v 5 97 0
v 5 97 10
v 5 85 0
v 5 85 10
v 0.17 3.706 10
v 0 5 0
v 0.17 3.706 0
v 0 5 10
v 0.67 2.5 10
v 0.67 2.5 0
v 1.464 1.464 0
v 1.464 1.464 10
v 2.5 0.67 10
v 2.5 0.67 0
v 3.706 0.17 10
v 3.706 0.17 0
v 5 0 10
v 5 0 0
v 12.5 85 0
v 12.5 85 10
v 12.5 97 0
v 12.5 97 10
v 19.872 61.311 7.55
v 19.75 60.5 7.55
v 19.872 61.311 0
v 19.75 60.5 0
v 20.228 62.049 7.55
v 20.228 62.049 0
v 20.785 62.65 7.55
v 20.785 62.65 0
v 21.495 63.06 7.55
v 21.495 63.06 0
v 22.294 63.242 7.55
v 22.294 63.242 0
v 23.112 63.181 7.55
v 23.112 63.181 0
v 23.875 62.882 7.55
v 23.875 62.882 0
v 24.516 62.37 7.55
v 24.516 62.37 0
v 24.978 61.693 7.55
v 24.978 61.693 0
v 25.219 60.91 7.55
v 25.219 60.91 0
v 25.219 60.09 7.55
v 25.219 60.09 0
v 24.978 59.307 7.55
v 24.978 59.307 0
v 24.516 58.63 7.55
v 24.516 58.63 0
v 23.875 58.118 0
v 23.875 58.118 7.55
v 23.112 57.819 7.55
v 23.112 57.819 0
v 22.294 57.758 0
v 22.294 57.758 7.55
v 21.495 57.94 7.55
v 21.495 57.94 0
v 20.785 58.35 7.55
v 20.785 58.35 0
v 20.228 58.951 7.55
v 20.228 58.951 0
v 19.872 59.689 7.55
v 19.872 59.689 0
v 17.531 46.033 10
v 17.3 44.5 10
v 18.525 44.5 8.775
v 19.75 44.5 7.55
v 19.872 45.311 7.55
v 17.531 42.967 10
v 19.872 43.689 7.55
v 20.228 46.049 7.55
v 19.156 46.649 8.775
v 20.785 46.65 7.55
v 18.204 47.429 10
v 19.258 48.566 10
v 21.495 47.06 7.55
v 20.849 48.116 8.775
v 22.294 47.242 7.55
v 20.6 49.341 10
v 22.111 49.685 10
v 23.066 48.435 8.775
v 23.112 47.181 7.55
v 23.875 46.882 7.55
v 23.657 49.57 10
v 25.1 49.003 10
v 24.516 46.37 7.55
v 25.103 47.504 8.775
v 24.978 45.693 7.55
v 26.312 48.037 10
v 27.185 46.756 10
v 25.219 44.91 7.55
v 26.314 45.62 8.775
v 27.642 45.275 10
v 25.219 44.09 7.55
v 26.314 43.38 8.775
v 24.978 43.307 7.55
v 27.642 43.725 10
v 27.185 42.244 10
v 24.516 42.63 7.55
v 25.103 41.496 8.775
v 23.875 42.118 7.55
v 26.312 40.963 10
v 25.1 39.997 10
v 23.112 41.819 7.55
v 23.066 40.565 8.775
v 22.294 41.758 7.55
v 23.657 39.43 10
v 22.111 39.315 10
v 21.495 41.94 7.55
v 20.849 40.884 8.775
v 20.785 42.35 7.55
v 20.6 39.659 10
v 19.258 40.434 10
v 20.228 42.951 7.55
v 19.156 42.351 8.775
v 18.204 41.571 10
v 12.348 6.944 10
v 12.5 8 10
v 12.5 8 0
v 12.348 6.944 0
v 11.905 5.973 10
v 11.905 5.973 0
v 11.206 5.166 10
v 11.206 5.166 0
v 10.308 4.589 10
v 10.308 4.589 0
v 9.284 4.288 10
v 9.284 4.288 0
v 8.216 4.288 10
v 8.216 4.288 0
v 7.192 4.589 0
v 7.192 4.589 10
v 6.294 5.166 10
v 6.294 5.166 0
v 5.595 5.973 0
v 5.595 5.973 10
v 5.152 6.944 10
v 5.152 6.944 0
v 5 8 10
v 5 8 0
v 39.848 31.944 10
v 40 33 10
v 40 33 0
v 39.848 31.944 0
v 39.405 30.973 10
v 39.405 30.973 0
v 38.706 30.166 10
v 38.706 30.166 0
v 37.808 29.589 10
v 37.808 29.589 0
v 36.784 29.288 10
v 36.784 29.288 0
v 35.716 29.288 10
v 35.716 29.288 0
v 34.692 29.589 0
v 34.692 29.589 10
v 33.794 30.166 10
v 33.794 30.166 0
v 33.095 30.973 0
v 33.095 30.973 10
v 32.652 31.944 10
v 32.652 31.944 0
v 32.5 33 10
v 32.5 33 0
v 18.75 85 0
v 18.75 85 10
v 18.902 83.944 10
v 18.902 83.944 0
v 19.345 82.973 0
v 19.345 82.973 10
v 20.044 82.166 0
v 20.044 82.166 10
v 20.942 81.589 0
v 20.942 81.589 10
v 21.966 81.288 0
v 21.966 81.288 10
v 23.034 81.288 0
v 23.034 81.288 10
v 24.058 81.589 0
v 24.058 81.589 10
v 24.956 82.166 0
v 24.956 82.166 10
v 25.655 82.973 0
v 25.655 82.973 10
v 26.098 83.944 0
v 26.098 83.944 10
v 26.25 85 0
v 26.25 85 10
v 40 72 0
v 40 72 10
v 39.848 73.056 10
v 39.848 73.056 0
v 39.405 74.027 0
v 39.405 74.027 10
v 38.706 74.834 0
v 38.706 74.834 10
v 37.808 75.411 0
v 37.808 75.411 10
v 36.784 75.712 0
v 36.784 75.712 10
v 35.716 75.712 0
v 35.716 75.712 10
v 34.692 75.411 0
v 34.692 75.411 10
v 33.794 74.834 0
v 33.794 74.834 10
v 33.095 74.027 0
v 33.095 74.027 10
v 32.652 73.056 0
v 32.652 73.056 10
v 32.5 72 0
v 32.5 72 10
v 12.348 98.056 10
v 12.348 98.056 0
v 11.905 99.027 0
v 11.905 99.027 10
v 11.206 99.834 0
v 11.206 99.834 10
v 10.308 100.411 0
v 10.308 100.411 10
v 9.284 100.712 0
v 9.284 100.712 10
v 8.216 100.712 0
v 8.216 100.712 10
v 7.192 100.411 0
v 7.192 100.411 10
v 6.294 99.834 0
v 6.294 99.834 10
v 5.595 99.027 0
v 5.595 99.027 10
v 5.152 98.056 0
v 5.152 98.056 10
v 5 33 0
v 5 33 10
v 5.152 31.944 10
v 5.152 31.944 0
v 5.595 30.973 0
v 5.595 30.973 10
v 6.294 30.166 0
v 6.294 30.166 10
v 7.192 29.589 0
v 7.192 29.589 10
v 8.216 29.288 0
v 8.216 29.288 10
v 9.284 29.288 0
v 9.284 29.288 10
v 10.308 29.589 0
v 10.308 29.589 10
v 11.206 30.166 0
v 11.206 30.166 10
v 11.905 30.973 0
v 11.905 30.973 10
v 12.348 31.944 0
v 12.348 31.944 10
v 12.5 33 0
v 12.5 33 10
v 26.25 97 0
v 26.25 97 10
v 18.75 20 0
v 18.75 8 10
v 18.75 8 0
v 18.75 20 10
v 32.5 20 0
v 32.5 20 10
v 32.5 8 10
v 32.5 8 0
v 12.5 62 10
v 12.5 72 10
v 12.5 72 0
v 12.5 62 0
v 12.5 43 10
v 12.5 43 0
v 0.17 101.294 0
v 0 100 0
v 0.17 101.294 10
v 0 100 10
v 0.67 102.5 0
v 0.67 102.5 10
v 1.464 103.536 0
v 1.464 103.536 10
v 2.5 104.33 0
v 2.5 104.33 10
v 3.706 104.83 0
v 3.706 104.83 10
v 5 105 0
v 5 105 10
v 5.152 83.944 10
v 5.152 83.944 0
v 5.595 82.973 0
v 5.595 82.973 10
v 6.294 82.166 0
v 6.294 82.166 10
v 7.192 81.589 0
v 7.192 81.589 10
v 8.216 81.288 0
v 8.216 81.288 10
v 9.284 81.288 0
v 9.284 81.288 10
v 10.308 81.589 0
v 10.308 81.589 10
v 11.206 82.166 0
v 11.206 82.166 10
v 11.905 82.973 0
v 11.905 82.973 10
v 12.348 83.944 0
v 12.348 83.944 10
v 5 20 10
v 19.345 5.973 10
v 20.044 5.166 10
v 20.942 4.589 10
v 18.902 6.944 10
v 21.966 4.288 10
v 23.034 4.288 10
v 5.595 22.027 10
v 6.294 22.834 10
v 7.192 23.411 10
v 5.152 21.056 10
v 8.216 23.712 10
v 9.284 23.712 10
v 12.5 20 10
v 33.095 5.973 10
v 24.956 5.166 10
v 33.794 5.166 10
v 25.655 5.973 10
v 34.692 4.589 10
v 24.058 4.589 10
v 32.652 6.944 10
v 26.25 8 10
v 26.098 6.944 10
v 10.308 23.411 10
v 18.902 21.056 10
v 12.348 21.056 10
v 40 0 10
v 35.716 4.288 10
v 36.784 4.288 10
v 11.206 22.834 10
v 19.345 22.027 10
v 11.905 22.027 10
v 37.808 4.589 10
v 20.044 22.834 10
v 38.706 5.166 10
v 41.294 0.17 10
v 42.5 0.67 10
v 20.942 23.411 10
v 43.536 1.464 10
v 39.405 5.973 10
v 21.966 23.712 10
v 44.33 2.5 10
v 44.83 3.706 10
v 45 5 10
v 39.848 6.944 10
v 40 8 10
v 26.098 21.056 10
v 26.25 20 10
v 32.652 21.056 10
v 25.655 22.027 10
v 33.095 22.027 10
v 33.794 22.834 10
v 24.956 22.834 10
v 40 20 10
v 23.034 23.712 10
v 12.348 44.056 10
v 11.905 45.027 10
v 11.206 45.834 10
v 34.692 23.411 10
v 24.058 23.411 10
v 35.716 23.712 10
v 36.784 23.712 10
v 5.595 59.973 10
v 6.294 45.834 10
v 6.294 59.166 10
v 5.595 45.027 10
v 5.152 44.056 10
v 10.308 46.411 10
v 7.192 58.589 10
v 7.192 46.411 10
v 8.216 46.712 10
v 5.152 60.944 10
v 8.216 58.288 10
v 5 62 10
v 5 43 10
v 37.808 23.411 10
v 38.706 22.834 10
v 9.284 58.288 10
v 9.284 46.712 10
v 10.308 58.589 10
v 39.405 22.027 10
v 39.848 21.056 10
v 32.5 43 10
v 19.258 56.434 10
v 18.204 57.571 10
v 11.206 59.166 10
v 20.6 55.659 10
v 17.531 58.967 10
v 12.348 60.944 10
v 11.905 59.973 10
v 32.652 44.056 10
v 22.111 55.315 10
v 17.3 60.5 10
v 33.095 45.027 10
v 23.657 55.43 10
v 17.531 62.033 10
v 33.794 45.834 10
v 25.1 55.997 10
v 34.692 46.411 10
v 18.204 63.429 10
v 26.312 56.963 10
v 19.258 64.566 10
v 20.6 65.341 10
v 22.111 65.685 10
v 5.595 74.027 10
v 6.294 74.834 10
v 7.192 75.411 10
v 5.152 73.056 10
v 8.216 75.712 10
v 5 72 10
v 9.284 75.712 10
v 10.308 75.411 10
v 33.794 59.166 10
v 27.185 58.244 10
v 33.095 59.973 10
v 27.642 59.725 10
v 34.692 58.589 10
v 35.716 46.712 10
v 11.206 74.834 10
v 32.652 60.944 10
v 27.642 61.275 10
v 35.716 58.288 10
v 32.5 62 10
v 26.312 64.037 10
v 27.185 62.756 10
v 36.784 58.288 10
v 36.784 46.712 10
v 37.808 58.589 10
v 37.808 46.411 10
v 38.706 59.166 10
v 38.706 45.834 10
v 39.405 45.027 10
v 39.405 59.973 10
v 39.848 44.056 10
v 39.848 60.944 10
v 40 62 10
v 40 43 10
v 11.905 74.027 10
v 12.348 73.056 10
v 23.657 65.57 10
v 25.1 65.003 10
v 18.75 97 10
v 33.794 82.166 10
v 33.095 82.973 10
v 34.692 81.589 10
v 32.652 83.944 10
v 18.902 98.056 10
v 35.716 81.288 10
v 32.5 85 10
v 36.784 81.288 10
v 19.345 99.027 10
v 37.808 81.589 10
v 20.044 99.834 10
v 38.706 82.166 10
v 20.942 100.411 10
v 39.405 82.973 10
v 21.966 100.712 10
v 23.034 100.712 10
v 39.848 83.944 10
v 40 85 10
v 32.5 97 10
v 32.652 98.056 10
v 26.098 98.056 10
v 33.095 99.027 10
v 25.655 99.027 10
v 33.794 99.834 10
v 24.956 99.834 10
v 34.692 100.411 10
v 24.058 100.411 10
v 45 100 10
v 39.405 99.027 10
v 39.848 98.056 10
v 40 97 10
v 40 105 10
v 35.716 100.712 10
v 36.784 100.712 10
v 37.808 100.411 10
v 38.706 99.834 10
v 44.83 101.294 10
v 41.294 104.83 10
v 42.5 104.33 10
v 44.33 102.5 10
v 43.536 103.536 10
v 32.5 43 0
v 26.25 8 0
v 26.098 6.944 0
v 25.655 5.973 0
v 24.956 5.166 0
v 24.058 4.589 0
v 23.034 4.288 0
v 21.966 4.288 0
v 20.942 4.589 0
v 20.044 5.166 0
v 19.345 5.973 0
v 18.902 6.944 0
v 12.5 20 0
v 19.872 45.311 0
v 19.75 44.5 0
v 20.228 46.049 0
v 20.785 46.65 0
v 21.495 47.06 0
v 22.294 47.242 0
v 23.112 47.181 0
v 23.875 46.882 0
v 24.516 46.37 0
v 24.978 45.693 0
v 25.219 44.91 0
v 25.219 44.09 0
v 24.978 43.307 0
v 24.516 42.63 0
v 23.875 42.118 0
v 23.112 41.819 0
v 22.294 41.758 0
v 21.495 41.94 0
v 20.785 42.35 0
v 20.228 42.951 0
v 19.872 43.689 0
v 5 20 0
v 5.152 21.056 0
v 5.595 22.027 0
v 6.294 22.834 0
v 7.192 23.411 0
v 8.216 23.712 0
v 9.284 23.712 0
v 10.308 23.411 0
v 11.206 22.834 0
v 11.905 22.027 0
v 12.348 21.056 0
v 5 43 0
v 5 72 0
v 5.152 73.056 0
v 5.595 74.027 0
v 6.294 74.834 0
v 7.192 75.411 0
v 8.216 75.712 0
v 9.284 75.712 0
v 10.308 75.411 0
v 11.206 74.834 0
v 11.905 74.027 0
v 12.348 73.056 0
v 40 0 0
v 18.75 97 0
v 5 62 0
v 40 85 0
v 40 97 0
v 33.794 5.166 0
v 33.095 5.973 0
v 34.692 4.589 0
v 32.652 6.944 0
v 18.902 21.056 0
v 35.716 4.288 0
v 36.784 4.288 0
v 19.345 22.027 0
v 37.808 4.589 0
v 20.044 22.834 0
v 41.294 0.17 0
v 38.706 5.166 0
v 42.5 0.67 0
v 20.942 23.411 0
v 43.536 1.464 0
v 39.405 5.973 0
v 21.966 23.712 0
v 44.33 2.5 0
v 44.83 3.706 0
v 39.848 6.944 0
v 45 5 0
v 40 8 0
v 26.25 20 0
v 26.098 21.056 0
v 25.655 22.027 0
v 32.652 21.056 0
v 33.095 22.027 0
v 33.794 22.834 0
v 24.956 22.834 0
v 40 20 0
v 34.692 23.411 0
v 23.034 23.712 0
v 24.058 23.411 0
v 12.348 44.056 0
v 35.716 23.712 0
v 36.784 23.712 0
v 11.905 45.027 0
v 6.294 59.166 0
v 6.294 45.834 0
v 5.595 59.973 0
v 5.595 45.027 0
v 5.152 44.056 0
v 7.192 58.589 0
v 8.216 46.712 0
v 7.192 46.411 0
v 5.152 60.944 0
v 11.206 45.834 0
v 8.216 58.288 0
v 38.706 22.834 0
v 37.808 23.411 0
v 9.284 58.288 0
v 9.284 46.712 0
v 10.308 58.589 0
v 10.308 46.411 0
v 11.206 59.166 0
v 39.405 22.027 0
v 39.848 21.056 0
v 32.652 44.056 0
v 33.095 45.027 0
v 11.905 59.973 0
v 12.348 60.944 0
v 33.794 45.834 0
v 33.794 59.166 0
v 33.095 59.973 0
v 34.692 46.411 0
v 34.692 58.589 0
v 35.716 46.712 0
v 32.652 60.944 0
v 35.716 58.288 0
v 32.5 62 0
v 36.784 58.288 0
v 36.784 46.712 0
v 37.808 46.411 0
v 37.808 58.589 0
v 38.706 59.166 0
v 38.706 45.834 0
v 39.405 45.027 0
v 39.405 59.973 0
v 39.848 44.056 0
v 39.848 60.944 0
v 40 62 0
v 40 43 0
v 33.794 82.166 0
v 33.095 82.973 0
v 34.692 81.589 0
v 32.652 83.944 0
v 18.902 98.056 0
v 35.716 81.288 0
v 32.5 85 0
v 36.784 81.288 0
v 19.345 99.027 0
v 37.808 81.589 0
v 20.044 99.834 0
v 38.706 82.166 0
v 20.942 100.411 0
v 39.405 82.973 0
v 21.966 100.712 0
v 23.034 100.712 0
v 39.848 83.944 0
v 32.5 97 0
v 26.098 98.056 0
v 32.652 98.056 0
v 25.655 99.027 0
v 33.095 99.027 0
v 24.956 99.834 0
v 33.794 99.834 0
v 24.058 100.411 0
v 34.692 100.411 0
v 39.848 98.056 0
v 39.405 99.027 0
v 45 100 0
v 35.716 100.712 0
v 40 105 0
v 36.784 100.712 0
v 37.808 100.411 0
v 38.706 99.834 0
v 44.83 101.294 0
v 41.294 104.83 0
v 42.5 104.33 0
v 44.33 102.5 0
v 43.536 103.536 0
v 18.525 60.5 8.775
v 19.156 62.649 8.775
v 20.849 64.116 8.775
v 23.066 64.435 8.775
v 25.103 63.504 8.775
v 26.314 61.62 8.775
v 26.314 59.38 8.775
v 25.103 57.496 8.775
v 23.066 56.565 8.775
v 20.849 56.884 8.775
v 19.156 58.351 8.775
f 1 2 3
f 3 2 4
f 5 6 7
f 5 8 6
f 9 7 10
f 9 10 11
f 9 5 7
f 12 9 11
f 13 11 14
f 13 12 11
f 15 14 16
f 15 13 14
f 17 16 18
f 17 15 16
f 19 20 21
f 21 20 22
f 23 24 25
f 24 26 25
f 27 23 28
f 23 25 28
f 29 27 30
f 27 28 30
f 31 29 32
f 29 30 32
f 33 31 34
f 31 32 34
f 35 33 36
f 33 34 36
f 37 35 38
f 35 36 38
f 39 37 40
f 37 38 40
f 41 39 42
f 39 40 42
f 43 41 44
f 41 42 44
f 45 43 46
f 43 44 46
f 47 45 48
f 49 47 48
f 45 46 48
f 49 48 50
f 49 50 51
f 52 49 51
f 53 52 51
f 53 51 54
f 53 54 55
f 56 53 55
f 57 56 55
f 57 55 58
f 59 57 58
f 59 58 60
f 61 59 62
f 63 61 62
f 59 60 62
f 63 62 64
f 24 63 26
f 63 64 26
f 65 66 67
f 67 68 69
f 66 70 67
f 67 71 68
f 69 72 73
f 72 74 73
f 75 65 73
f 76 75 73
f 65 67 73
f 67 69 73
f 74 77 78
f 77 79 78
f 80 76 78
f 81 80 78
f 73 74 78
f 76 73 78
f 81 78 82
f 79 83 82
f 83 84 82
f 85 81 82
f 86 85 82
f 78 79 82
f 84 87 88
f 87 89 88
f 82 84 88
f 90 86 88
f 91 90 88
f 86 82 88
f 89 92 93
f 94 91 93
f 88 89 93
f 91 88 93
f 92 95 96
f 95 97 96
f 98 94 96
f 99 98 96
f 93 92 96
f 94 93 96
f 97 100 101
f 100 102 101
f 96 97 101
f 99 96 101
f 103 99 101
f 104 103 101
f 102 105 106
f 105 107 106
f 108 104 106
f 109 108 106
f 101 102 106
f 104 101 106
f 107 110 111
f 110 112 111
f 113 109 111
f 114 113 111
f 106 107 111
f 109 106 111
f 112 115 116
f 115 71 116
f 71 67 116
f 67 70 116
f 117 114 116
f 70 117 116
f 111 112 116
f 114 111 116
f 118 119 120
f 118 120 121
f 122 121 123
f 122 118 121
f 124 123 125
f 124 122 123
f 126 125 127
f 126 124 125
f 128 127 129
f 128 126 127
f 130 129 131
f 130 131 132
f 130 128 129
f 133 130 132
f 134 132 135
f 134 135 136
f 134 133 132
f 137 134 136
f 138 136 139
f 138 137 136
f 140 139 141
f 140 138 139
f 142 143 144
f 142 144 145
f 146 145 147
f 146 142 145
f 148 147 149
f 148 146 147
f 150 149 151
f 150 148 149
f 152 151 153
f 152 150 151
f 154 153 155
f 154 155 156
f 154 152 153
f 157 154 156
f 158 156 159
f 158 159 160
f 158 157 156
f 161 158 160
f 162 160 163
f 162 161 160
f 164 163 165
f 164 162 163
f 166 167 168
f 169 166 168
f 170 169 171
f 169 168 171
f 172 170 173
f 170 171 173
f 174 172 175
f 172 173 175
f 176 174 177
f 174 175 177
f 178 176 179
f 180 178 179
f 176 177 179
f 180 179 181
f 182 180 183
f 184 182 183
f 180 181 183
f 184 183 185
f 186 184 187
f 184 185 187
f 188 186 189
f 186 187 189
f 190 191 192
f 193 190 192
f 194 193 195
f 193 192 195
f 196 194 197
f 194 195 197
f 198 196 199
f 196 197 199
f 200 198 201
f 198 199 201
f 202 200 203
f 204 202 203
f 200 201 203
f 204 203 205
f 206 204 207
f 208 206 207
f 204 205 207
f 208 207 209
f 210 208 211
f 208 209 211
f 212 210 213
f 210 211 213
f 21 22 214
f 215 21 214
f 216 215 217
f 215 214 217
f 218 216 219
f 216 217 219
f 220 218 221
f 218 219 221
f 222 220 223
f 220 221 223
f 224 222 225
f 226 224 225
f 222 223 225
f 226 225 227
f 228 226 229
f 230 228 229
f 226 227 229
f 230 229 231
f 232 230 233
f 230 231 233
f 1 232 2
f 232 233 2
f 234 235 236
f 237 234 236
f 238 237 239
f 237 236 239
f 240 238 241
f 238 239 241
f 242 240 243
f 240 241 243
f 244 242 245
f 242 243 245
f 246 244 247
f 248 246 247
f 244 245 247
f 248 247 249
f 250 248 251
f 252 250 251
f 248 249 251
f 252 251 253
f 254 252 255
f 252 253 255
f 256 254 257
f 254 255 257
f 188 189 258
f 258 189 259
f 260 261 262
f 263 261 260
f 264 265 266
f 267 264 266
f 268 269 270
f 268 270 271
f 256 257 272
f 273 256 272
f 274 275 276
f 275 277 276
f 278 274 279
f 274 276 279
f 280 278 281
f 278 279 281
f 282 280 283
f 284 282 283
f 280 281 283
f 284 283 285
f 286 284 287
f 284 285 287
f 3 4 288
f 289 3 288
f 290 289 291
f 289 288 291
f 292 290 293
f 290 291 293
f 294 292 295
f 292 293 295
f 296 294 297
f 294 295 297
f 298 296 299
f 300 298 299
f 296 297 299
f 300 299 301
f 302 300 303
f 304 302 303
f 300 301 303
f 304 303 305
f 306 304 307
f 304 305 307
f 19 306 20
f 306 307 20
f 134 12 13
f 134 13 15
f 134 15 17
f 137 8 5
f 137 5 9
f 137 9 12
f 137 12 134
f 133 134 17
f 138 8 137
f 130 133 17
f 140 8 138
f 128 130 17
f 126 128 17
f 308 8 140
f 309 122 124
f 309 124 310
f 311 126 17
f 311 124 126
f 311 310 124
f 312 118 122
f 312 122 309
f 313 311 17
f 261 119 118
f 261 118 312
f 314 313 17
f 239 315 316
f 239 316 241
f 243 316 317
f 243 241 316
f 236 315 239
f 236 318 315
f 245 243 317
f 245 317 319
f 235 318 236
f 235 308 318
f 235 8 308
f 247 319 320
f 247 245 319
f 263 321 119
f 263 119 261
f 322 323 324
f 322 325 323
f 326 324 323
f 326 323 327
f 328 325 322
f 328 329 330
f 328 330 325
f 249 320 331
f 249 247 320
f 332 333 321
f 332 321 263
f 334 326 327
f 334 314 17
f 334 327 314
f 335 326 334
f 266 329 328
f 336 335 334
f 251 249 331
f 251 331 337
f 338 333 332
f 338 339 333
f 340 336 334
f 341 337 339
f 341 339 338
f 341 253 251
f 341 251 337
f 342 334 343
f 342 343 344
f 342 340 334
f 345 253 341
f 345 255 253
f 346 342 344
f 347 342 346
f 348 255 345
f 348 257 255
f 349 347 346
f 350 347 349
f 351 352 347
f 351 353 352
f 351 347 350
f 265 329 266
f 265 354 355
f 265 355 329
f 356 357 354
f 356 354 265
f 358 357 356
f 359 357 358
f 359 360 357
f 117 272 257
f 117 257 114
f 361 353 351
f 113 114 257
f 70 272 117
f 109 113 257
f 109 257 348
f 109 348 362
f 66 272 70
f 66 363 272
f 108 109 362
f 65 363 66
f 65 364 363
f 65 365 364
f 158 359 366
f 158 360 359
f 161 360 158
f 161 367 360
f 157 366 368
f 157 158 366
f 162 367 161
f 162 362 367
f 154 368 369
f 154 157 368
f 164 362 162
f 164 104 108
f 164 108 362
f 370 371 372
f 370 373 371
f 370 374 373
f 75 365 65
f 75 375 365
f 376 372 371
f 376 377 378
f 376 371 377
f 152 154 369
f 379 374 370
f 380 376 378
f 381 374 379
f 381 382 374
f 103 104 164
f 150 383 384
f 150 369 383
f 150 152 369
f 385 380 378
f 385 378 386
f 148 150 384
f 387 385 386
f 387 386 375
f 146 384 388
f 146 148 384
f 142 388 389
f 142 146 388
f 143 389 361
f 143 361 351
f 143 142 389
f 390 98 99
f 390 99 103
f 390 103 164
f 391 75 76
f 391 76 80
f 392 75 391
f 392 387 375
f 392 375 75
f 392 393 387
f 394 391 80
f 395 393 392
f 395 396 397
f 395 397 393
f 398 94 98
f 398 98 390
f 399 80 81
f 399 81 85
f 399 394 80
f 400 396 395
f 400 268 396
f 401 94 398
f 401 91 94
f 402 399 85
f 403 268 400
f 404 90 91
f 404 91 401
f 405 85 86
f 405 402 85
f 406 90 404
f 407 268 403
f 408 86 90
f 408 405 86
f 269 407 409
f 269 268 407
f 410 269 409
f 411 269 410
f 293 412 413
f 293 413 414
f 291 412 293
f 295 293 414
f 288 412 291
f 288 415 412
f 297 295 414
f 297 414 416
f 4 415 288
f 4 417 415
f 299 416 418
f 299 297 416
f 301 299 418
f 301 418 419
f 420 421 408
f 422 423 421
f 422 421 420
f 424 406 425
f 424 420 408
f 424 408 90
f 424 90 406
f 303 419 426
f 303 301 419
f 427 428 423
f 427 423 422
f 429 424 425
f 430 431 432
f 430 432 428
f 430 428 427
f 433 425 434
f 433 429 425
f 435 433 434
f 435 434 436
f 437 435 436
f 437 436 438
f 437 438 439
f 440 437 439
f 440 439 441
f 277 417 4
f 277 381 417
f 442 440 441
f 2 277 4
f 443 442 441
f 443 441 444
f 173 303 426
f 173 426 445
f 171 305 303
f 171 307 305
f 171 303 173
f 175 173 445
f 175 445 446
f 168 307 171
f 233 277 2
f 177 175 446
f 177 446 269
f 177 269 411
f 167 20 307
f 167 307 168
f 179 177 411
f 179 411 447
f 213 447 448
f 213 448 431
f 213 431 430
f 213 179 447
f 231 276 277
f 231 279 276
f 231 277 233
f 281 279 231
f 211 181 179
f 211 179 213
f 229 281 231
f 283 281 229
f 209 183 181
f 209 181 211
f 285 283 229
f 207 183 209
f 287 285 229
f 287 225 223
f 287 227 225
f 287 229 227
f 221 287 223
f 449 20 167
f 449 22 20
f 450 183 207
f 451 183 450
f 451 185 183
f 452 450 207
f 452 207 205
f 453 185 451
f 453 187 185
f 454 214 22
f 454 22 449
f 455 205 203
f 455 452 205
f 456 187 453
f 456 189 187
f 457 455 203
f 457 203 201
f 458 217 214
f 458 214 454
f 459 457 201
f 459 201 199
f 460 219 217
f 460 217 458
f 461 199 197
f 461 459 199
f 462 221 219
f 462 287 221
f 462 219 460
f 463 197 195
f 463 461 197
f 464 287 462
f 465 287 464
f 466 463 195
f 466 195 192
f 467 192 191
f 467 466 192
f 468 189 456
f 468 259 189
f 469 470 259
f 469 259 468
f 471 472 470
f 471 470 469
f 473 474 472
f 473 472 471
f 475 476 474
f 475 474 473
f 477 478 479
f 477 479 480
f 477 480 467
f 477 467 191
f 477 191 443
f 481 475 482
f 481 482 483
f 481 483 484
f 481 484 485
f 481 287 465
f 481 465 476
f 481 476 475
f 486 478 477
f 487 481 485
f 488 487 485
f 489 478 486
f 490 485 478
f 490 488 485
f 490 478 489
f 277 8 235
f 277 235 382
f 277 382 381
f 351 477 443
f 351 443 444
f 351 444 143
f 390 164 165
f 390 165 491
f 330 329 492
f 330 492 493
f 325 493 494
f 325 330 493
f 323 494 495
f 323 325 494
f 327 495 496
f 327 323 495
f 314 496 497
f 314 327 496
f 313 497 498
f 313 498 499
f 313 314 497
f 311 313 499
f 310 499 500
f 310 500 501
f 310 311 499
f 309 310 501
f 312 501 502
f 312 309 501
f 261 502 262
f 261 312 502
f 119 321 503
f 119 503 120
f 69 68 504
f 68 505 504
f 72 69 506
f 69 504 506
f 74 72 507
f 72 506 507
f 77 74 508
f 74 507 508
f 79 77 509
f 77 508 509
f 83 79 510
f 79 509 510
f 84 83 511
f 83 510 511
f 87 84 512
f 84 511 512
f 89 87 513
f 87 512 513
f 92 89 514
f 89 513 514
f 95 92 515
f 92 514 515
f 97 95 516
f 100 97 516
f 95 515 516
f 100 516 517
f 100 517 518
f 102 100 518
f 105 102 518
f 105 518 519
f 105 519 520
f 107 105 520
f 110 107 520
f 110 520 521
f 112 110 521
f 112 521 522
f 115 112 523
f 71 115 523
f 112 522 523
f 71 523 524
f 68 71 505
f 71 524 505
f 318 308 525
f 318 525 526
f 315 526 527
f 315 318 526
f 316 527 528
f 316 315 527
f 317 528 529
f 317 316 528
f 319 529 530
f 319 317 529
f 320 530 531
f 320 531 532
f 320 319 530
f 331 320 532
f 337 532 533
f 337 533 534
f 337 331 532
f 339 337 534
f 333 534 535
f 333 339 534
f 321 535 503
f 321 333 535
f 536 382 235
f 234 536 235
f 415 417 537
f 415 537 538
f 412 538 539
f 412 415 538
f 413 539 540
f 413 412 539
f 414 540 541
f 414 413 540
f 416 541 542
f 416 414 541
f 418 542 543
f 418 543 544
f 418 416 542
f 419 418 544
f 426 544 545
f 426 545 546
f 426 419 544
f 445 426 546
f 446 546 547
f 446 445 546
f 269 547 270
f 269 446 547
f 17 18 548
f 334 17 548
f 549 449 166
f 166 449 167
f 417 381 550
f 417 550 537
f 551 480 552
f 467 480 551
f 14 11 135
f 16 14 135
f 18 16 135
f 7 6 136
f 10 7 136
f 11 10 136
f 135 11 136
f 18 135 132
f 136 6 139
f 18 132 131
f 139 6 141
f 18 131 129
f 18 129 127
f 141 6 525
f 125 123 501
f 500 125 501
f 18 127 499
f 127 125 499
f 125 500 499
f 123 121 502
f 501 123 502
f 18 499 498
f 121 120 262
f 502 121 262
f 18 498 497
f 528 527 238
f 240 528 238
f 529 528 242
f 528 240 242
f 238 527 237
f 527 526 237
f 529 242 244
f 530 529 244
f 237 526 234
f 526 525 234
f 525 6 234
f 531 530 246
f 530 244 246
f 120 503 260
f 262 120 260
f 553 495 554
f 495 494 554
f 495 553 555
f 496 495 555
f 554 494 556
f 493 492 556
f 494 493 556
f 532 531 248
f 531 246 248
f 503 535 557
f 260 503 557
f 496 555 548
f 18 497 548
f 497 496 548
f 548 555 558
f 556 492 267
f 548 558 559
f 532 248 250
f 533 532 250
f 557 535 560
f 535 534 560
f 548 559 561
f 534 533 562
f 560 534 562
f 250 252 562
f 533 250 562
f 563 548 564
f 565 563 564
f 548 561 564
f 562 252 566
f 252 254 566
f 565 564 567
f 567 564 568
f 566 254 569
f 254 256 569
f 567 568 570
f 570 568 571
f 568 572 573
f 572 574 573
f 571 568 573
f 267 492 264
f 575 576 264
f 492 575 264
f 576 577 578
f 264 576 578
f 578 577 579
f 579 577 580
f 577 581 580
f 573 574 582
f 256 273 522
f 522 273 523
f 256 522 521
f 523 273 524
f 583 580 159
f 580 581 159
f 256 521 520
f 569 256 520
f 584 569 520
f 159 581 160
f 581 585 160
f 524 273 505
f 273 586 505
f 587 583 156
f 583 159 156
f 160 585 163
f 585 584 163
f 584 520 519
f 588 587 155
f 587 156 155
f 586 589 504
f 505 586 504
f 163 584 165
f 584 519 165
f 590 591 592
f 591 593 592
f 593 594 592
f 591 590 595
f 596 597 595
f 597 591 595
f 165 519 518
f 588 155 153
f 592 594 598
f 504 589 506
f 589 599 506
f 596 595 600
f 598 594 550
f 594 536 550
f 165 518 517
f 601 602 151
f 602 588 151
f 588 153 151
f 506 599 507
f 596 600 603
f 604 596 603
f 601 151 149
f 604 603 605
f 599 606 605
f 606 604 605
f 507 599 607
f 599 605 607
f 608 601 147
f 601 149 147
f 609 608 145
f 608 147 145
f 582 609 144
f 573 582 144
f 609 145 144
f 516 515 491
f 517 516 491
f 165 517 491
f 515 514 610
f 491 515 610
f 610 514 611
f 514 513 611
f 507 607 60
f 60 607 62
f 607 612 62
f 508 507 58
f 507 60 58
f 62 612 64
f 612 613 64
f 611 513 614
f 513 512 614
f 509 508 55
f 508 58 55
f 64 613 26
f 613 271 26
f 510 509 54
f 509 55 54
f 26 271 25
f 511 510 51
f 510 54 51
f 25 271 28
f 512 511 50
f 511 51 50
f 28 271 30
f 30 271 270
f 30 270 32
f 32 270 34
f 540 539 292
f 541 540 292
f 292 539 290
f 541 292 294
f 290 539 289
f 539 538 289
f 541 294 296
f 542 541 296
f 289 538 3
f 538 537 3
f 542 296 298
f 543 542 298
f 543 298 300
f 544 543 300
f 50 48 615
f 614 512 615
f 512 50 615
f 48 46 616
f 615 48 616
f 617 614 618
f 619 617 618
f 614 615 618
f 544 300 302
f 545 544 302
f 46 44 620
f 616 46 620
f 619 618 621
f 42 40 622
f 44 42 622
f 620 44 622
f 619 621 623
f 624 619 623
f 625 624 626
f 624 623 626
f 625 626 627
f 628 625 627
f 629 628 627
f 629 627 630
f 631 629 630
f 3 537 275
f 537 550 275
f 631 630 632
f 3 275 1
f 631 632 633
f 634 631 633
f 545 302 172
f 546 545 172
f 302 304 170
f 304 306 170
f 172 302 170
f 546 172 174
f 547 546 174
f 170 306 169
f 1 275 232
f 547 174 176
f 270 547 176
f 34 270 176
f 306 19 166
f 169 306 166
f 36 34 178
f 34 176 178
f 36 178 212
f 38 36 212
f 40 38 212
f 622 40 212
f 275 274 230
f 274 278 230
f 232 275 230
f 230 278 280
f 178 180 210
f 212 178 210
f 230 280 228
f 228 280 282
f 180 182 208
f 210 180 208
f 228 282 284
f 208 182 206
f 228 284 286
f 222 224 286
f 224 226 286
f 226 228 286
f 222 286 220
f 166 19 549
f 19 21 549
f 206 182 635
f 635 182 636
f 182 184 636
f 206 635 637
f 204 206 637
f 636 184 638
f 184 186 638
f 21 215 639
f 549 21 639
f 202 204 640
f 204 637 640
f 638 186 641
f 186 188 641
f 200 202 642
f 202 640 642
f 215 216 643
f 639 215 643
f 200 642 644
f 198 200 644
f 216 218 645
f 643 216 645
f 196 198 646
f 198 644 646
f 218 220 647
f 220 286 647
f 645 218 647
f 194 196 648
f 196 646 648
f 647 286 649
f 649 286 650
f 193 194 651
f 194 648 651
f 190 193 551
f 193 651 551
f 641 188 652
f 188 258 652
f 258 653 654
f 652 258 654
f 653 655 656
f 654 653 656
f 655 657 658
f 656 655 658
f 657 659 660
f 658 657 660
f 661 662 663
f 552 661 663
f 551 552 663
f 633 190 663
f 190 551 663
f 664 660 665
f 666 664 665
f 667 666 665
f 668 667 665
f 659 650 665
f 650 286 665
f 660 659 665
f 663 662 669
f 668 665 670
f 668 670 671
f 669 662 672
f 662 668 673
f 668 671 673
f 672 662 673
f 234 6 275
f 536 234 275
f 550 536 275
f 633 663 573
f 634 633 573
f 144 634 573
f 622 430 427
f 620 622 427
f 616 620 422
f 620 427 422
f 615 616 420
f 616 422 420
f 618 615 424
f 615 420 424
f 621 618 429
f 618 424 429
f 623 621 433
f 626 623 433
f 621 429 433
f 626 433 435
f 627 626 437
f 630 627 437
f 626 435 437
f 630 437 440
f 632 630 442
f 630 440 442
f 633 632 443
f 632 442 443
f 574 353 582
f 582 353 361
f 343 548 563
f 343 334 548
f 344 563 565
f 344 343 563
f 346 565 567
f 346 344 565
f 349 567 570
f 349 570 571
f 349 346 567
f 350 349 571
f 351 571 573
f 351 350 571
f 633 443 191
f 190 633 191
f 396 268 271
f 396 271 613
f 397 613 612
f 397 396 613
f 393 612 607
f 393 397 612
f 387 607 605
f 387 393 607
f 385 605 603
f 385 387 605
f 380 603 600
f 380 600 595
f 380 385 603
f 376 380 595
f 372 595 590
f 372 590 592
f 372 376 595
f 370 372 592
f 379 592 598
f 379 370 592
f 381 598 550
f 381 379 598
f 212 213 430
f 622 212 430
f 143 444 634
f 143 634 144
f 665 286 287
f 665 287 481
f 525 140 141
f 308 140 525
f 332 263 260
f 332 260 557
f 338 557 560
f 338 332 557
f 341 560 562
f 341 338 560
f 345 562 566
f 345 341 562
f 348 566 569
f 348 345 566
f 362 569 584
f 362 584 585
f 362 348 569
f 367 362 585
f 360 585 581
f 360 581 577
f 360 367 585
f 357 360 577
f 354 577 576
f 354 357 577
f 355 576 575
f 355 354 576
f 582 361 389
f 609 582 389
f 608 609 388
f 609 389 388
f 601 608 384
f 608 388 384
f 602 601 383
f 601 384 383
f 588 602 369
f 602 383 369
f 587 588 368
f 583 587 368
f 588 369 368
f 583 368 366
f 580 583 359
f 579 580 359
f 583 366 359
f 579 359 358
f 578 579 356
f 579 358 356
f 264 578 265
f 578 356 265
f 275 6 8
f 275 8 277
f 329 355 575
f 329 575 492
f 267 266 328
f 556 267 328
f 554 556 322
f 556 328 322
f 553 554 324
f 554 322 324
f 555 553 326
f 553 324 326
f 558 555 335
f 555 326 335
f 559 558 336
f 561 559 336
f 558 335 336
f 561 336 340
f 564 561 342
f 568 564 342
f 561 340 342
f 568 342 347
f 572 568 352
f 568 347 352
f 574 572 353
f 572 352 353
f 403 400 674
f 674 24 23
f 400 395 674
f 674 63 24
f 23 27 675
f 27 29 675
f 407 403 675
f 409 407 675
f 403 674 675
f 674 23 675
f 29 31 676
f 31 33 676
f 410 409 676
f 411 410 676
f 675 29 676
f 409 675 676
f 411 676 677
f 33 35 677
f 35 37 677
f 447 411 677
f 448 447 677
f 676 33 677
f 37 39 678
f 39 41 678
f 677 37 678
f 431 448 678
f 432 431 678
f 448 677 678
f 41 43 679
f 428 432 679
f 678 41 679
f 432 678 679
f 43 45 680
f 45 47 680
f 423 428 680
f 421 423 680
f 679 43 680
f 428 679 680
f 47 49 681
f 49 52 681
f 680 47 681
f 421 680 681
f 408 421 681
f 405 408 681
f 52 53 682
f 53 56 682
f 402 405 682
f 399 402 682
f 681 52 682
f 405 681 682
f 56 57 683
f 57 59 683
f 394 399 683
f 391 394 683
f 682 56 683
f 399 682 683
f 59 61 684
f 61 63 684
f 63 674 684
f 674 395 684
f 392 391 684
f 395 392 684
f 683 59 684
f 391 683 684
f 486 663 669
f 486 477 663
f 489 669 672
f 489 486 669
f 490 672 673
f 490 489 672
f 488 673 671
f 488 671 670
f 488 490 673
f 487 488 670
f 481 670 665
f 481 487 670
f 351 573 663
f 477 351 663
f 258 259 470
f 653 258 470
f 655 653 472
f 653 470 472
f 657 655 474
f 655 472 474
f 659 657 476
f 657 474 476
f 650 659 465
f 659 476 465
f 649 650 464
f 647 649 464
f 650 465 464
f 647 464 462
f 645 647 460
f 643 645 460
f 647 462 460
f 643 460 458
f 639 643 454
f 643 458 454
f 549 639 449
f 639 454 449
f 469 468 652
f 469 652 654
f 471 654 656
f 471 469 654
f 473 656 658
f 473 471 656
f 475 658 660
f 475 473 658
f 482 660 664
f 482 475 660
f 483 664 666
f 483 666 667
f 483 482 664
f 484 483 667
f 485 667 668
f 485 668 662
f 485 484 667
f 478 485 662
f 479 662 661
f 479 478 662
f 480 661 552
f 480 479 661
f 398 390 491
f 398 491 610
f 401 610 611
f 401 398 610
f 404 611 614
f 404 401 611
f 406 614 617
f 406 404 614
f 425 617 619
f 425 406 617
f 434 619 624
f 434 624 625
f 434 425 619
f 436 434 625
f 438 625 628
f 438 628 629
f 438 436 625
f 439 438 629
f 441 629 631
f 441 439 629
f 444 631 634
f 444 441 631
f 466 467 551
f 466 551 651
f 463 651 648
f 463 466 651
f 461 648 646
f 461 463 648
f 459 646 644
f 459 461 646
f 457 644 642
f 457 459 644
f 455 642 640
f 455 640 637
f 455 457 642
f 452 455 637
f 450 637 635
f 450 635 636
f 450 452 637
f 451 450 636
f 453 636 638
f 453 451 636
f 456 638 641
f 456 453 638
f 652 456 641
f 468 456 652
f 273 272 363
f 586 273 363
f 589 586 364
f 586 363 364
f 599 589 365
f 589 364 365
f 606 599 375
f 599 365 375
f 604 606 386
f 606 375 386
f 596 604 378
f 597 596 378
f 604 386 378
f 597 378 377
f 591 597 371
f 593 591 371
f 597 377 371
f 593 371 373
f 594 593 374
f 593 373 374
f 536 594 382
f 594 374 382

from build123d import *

# Parameters (mm, degrees)
SKETCH1_W                                     = 45
SKETCH1_H                                     = 105
BOSS_EXTRUDE1_DEPTH                           = 10
FILLET1_R                                     = 5
CUT_EXTRUDE1_DEPTH                            = 10
CSK_FOR_M5_COUNTERSUNK_FLAT_HEAD1_D           = 5.5
CSK_FOR_M5_COUNTERSUNK_FLAT_HEAD1_DEPTH       = 30
CSK_FOR_M5_COUNTERSUNK_FLAT_HEAD1_CSINK_D     = 10.4
CSK_FOR_M5_COUNTERSUNK_FLAT_HEAD1_CSINK_ANGLE = 90
CSK_FOR_M5_COUNTERSUNK_FLAT_HEAD1_TIP         = 1.652366702


with BuildPart() as part:
    # Sketch1 → Boss-Extrude1 (new body)
    with BuildSketch(Plane.XY):
        with Locations((22.5, 52.5)):
            Rectangle(SKETCH1_W, SKETCH1_H)
    extrude(amount=BOSS_EXTRUDE1_DEPTH)

    # Fillet1
    fillet1_edges = [part.edges().sort_by_distance(p)[0] for p in [
        (0, 105, 5),
        (45, 105, 5),
        (45, 0, 5),
        (0, 0, 5),
    ]]
    fillet(fillet1_edges, radius=FILLET1_R)

    # Sketch2 → Cut-Extrude1 (cut)
    with BuildSketch(Plane.XY.offset(10)):
        with BuildLine():
            Line((12.5, 20), (12.5, 8))
            ThreePointArc((12.5, 8), (8.75, 4.25), (5, 8))
            Line((5, 8), (5, 20))
            ThreePointArc((5, 20), (8.75, 23.75), (12.5, 20))
        make_face()
        with BuildLine():
            Line((12.5, 72), (12.5, 62))
            ThreePointArc((12.5, 62), (8.75, 58.25), (5, 62))
            Line((5, 62), (5, 72))
            ThreePointArc((5, 72), (8.75, 75.75), (12.5, 72))
        make_face()
        with BuildLine():
            Line((32.5, 20), (32.5, 8))
            ThreePointArc((32.5, 8), (36.25, 4.25), (40, 8))
            Line((40, 8), (40, 20))
            ThreePointArc((40, 20), (36.25, 23.75), (32.5, 20))
        make_face()
        with BuildLine():
            Line((32.5, 72), (32.5, 62))
            ThreePointArc((32.5, 62), (36.25, 58.25), (40, 62))
            Line((40, 62), (40, 72))
            ThreePointArc((40, 72), (36.25, 75.75), (32.5, 72))
        make_face()
        with BuildLine():
            Line((32.5, 85), (32.5, 97))
            ThreePointArc((32.5, 97), (36.25, 100.75), (40, 97))
            Line((40, 97), (40, 85))
            ThreePointArc((40, 85), (36.25, 81.25), (32.5, 85))
        make_face()
        with BuildLine():
            Line((32.5, 33), (32.5, 43))
            ThreePointArc((32.5, 43), (36.25, 46.75), (40, 43))
            Line((40, 43), (40, 33))
            ThreePointArc((40, 33), (36.25, 29.25), (32.5, 33))
        make_face()
        with BuildLine():
            Line((12.5, 85), (12.5, 97))
            ThreePointArc((12.5, 97), (8.75, 100.75), (5, 97))
            Line((5, 97), (5, 85))
            ThreePointArc((5, 85), (8.75, 81.25), (12.5, 85))
        make_face()
        with BuildLine():
            Line((26.25, 85), (26.25, 97))
            ThreePointArc((26.25, 97), (22.5, 100.75), (18.75, 97))
            Line((18.75, 97), (18.75, 85))
            ThreePointArc((18.75, 85), (22.5, 81.25), (26.25, 85))
        make_face()
        with BuildLine():
            Line((26.25, 20), (26.25, 8))
            ThreePointArc((26.25, 8), (22.5, 4.25), (18.75, 8))
            Line((18.75, 8), (18.75, 20))
            ThreePointArc((18.75, 20), (22.5, 23.75), (26.25, 20))
        make_face()
        with BuildLine():
            Line((12.5, 33), (12.5, 43))
            ThreePointArc((12.5, 43), (8.75, 46.75), (5, 43))
            Line((5, 43), (5, 33))
            ThreePointArc((5, 33), (8.75, 29.25), (12.5, 33))
        make_face()
    extrude(amount=-CUT_EXTRUDE1_DEPTH, mode=Mode.SUBTRACT)

    # CSK for M5 Countersunk Flat Head1
    with Locations(Plane.XY.offset(10)):
        with Locations((22.5, 60.5), (22.5, 44.5)):
            CounterSinkHole(CSK_FOR_M5_COUNTERSUNK_FLAT_HEAD1_D / 2, CSK_FOR_M5_COUNTERSUNK_FLAT_HEAD1_CSINK_D / 2, depth=CSK_FOR_M5_COUNTERSUNK_FLAT_HEAD1_DEPTH, counter_sink_angle=CSK_FOR_M5_COUNTERSUNK_FLAT_HEAD1_CSINK_ANGLE)
            with Locations((0, 0, -(CSK_FOR_M5_COUNTERSUNK_FLAT_HEAD1_DEPTH + CSK_FOR_M5_COUNTERSUNK_FLAT_HEAD1_TIP / 2))):  # 118° drill point
                Cone(0, CSK_FOR_M5_COUNTERSUNK_FLAT_HEAD1_D / 2, CSK_FOR_M5_COUNTERSUNK_FLAT_HEAD1_TIP, mode=Mode.SUBTRACT)


solid = part.part
